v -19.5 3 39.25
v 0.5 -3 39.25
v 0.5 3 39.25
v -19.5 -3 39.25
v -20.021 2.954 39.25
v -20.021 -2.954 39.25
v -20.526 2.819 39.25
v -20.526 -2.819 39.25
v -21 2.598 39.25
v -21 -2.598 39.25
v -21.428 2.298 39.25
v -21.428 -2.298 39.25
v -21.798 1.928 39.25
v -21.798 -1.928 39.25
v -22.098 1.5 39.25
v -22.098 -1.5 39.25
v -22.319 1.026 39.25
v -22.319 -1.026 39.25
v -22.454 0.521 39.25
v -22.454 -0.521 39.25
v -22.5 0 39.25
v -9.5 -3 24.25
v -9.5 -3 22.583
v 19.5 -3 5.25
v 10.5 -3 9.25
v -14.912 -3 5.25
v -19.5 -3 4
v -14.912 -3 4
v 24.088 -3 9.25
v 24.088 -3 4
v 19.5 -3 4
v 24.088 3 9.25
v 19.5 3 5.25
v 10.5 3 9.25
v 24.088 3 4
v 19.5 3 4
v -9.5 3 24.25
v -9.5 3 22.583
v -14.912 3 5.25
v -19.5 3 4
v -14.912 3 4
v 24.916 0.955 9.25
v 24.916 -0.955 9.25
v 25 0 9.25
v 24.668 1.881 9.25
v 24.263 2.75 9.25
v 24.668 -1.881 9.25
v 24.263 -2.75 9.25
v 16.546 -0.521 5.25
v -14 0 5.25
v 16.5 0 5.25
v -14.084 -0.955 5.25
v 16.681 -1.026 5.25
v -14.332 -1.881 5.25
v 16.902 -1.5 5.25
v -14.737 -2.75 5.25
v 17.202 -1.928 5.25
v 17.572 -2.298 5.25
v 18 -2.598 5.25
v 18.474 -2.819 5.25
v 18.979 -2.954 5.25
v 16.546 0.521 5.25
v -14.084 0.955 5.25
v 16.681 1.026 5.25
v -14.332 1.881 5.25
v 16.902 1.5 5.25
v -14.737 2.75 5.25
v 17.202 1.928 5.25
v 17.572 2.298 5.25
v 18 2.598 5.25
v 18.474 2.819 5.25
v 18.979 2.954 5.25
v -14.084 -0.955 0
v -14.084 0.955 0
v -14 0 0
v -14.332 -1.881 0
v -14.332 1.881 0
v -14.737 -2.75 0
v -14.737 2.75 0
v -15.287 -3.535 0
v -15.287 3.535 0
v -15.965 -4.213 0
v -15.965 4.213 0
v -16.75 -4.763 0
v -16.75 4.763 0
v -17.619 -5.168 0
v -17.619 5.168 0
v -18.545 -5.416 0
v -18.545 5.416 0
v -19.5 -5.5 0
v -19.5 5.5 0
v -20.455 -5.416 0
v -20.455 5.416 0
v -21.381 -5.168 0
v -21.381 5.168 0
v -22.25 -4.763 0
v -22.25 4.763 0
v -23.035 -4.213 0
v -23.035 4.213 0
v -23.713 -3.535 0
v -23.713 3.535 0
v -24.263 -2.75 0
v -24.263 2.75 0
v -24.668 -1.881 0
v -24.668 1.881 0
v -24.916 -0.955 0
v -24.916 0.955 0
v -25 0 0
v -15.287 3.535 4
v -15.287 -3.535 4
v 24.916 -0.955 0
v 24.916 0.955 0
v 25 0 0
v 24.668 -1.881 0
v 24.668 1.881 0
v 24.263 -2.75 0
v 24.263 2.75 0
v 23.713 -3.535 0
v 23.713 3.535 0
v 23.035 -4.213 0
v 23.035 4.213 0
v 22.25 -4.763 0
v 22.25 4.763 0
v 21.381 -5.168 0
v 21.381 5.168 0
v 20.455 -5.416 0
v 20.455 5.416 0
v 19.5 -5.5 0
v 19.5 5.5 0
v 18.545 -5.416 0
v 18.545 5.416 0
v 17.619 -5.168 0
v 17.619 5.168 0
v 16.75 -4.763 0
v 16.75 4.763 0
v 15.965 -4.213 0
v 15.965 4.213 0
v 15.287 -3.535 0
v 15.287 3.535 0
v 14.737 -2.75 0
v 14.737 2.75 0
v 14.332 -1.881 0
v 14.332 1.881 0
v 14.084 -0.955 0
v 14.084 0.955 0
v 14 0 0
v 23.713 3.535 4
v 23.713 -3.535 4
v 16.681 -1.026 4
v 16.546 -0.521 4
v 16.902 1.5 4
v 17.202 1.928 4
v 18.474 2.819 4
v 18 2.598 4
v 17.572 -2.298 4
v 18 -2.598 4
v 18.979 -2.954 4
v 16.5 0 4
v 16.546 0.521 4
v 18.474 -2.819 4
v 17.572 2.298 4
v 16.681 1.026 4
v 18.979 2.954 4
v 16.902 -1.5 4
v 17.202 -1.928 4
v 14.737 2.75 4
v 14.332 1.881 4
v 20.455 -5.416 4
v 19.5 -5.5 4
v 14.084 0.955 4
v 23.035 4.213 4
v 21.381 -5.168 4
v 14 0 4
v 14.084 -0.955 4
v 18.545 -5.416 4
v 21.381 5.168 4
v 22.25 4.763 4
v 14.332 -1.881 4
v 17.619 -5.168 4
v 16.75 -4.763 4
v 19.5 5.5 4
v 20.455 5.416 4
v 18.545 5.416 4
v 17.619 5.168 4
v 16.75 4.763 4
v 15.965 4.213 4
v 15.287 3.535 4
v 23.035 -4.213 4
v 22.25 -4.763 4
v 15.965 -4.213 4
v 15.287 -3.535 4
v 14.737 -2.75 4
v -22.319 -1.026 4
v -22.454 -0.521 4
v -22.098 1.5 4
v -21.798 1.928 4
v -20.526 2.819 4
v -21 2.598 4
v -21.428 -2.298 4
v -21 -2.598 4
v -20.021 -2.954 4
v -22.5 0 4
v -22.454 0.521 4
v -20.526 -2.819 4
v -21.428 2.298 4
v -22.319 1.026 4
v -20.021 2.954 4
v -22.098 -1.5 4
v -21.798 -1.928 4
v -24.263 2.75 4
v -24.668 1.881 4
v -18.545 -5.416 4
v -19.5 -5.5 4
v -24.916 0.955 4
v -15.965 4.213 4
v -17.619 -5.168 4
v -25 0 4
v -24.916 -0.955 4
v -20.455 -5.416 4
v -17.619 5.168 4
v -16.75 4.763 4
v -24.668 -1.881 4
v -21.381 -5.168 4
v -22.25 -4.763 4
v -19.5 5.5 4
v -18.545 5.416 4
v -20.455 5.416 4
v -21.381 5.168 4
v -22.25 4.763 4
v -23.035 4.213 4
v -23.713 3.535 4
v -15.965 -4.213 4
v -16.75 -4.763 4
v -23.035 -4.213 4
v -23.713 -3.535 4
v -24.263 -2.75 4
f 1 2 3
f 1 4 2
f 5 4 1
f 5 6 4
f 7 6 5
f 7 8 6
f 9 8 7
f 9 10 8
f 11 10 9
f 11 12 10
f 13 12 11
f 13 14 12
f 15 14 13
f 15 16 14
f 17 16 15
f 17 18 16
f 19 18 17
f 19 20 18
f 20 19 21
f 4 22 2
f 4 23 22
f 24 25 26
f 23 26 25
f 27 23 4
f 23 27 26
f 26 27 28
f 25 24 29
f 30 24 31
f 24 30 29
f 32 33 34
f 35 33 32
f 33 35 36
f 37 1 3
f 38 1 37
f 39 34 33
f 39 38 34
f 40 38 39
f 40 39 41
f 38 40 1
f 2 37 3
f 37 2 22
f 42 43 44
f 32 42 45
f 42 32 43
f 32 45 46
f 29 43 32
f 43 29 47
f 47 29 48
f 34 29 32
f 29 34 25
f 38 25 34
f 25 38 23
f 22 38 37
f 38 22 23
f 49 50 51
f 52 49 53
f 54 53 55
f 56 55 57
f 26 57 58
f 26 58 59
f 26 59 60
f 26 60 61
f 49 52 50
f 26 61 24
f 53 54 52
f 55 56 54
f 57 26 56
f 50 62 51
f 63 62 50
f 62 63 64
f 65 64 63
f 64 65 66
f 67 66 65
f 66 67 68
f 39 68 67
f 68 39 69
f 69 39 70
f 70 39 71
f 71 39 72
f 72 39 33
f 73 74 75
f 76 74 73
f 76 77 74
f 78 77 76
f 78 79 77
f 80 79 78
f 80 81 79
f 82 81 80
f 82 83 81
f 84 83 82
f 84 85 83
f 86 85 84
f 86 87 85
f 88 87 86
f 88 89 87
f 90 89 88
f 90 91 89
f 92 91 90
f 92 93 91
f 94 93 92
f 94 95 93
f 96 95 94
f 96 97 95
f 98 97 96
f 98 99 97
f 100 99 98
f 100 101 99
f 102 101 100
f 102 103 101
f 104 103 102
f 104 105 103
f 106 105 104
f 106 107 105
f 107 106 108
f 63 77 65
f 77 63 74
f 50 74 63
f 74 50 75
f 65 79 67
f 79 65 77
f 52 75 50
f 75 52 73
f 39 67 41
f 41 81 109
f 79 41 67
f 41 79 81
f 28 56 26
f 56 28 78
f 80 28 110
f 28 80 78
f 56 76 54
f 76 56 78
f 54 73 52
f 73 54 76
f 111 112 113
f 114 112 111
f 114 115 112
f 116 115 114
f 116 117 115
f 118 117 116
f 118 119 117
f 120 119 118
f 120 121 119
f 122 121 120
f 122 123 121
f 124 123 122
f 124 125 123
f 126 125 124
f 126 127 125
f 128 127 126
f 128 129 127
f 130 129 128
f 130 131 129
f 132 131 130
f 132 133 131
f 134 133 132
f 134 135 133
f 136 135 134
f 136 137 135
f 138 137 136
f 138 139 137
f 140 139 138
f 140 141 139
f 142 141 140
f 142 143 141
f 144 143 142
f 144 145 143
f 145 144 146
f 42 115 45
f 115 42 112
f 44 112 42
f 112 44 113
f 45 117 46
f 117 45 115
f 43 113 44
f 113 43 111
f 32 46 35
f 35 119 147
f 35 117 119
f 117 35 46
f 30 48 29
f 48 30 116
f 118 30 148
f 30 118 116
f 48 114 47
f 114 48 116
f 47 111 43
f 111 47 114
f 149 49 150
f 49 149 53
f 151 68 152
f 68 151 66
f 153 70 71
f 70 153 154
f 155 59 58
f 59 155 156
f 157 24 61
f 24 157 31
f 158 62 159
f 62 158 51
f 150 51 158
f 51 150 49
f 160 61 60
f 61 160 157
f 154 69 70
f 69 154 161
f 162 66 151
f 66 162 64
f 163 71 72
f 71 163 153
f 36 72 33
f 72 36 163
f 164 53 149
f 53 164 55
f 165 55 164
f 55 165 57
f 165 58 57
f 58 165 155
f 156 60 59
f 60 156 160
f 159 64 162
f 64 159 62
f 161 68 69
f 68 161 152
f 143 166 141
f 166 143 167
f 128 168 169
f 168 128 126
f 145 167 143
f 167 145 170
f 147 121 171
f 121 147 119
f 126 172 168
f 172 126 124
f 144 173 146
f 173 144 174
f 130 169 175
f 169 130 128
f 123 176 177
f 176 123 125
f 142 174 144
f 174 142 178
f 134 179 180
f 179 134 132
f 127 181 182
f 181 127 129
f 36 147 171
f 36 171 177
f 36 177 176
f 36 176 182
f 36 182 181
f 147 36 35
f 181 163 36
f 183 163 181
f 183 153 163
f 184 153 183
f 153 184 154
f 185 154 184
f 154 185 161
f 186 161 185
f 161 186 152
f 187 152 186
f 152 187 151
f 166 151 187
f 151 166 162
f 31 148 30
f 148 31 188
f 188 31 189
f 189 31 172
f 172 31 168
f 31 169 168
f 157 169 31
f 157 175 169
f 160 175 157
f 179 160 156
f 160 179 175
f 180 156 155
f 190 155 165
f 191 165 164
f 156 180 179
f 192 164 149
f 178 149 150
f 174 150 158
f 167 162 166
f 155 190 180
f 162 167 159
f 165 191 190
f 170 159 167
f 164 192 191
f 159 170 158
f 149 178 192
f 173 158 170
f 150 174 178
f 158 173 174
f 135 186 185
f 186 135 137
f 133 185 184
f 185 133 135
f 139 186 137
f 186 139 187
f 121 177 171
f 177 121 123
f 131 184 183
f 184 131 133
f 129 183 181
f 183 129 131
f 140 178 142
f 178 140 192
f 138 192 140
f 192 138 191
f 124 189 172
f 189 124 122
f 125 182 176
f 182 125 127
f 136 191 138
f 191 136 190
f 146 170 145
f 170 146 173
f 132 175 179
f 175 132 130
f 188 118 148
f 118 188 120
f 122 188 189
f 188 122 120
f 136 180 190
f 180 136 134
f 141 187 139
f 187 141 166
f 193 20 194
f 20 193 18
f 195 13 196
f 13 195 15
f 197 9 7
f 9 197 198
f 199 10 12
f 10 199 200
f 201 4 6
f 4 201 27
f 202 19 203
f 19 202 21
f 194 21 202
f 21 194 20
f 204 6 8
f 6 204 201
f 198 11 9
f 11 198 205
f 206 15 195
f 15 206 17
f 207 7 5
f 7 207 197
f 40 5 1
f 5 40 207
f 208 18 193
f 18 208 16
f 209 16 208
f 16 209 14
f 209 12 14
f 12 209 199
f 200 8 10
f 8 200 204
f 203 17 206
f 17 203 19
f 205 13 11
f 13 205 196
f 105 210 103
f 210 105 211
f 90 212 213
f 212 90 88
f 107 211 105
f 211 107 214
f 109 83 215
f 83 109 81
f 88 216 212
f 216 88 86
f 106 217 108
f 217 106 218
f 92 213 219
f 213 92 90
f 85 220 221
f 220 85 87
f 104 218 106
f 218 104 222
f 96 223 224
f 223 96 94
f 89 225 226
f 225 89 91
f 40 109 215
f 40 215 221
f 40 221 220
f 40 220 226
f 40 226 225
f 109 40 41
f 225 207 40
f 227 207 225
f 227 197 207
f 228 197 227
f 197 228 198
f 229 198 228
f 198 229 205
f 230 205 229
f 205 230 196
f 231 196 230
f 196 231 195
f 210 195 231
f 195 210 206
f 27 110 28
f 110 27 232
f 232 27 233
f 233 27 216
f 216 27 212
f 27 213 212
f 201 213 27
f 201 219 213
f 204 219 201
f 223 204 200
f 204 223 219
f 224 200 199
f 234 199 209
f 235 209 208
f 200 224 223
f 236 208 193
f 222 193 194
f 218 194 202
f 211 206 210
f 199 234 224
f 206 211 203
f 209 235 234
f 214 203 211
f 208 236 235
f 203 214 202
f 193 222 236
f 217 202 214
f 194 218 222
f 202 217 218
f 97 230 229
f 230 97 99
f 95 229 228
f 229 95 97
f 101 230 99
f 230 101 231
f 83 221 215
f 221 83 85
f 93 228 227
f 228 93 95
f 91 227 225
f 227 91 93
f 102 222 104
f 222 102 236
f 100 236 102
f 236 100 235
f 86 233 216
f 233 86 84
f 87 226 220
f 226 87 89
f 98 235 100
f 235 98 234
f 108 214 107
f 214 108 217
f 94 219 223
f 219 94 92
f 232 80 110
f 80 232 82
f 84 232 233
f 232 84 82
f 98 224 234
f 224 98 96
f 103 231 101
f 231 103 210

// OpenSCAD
// for precise messurement points see the supplied pictures

//diameter of the large round part of the key hole,make smaller then real (for clearaces)
key_big = 11;
//diameter of the small offshoot from the main key cylinder,make smaller then real (for clearaces)
key_small = 6;

//distance from one key hole to the same point in the next key hole, make slightly bigger then real (for clearaces)
key_spacing = 39;
//thickness of the material the key holes are kut out of, make slightly bigger then real (for clearaces)
key_thickness = 1.25;

//the distance the hook extends from the support, poke should be bigger then hook
poke = 30;
//total hight if hook tip, hook width will = half this, hook should be smaller then poke
hook = 20;
//thickness of lugs and support bar
support_thickness = 4;


//turning the numbers into what object needs

hookStart = support_thickness*2+key_thickness;
angle = atan ( hook / poke);
hype = poke + hook;
KBR = key_big/2;
KSR = key_small/2;
 
module wedge()  {
	translate([0,-key_small,0]) difference() {
		cube([poke,key_small,hook]);
		rotate(a=[0,-angle,0])translate([0,-1,0])cube([hype,key_small+2,hook]);
	}	}

module betterjoints() {
	intersection(){
		translate([0,-KSR,0])cube([key_spacing,key_small,support_thickness*2+key_thickness]);
		cylinder(h= support_thickness*2+key_thickness ,r1 = KBR , r2 = KBR,$fn=36);
	}
}

translate([-KBR- key_spacing/2,-KBR,0]) {		//to centre item on the build platform


translate([KBR,KBR - KSR,hookStart]) {		//hook and support bar making section
	cube([hook/2,key_small,poke]);
	rotate(a=[0,270,180]) wedge();
	translate([poke,0,0])rotate(a=[0,0,180]) wedge();
	translate([0,0,-support_thickness]) cube([key_spacing,key_small,support_thickness]);
	}

translate([KBR,KBR,0]) {								//post 1
	cylinder(h= hookStart + poke, r1 = KSR ,r2 = KSR,$fn=36);
	cylinder(h= support_thickness ,r1 = KBR , r2 = KBR,$fn=36);
	betterjoints();
	translate([key_spacing,0,0]){						//post 2
		cylinder(h= hookStart, r1 = KSR ,r2 = KSR,$fn=36);
		cylinder(h= support_thickness ,r1 = KBR , r2 = KBR,$fn=36);
		betterjoints();
		}
	}
}
